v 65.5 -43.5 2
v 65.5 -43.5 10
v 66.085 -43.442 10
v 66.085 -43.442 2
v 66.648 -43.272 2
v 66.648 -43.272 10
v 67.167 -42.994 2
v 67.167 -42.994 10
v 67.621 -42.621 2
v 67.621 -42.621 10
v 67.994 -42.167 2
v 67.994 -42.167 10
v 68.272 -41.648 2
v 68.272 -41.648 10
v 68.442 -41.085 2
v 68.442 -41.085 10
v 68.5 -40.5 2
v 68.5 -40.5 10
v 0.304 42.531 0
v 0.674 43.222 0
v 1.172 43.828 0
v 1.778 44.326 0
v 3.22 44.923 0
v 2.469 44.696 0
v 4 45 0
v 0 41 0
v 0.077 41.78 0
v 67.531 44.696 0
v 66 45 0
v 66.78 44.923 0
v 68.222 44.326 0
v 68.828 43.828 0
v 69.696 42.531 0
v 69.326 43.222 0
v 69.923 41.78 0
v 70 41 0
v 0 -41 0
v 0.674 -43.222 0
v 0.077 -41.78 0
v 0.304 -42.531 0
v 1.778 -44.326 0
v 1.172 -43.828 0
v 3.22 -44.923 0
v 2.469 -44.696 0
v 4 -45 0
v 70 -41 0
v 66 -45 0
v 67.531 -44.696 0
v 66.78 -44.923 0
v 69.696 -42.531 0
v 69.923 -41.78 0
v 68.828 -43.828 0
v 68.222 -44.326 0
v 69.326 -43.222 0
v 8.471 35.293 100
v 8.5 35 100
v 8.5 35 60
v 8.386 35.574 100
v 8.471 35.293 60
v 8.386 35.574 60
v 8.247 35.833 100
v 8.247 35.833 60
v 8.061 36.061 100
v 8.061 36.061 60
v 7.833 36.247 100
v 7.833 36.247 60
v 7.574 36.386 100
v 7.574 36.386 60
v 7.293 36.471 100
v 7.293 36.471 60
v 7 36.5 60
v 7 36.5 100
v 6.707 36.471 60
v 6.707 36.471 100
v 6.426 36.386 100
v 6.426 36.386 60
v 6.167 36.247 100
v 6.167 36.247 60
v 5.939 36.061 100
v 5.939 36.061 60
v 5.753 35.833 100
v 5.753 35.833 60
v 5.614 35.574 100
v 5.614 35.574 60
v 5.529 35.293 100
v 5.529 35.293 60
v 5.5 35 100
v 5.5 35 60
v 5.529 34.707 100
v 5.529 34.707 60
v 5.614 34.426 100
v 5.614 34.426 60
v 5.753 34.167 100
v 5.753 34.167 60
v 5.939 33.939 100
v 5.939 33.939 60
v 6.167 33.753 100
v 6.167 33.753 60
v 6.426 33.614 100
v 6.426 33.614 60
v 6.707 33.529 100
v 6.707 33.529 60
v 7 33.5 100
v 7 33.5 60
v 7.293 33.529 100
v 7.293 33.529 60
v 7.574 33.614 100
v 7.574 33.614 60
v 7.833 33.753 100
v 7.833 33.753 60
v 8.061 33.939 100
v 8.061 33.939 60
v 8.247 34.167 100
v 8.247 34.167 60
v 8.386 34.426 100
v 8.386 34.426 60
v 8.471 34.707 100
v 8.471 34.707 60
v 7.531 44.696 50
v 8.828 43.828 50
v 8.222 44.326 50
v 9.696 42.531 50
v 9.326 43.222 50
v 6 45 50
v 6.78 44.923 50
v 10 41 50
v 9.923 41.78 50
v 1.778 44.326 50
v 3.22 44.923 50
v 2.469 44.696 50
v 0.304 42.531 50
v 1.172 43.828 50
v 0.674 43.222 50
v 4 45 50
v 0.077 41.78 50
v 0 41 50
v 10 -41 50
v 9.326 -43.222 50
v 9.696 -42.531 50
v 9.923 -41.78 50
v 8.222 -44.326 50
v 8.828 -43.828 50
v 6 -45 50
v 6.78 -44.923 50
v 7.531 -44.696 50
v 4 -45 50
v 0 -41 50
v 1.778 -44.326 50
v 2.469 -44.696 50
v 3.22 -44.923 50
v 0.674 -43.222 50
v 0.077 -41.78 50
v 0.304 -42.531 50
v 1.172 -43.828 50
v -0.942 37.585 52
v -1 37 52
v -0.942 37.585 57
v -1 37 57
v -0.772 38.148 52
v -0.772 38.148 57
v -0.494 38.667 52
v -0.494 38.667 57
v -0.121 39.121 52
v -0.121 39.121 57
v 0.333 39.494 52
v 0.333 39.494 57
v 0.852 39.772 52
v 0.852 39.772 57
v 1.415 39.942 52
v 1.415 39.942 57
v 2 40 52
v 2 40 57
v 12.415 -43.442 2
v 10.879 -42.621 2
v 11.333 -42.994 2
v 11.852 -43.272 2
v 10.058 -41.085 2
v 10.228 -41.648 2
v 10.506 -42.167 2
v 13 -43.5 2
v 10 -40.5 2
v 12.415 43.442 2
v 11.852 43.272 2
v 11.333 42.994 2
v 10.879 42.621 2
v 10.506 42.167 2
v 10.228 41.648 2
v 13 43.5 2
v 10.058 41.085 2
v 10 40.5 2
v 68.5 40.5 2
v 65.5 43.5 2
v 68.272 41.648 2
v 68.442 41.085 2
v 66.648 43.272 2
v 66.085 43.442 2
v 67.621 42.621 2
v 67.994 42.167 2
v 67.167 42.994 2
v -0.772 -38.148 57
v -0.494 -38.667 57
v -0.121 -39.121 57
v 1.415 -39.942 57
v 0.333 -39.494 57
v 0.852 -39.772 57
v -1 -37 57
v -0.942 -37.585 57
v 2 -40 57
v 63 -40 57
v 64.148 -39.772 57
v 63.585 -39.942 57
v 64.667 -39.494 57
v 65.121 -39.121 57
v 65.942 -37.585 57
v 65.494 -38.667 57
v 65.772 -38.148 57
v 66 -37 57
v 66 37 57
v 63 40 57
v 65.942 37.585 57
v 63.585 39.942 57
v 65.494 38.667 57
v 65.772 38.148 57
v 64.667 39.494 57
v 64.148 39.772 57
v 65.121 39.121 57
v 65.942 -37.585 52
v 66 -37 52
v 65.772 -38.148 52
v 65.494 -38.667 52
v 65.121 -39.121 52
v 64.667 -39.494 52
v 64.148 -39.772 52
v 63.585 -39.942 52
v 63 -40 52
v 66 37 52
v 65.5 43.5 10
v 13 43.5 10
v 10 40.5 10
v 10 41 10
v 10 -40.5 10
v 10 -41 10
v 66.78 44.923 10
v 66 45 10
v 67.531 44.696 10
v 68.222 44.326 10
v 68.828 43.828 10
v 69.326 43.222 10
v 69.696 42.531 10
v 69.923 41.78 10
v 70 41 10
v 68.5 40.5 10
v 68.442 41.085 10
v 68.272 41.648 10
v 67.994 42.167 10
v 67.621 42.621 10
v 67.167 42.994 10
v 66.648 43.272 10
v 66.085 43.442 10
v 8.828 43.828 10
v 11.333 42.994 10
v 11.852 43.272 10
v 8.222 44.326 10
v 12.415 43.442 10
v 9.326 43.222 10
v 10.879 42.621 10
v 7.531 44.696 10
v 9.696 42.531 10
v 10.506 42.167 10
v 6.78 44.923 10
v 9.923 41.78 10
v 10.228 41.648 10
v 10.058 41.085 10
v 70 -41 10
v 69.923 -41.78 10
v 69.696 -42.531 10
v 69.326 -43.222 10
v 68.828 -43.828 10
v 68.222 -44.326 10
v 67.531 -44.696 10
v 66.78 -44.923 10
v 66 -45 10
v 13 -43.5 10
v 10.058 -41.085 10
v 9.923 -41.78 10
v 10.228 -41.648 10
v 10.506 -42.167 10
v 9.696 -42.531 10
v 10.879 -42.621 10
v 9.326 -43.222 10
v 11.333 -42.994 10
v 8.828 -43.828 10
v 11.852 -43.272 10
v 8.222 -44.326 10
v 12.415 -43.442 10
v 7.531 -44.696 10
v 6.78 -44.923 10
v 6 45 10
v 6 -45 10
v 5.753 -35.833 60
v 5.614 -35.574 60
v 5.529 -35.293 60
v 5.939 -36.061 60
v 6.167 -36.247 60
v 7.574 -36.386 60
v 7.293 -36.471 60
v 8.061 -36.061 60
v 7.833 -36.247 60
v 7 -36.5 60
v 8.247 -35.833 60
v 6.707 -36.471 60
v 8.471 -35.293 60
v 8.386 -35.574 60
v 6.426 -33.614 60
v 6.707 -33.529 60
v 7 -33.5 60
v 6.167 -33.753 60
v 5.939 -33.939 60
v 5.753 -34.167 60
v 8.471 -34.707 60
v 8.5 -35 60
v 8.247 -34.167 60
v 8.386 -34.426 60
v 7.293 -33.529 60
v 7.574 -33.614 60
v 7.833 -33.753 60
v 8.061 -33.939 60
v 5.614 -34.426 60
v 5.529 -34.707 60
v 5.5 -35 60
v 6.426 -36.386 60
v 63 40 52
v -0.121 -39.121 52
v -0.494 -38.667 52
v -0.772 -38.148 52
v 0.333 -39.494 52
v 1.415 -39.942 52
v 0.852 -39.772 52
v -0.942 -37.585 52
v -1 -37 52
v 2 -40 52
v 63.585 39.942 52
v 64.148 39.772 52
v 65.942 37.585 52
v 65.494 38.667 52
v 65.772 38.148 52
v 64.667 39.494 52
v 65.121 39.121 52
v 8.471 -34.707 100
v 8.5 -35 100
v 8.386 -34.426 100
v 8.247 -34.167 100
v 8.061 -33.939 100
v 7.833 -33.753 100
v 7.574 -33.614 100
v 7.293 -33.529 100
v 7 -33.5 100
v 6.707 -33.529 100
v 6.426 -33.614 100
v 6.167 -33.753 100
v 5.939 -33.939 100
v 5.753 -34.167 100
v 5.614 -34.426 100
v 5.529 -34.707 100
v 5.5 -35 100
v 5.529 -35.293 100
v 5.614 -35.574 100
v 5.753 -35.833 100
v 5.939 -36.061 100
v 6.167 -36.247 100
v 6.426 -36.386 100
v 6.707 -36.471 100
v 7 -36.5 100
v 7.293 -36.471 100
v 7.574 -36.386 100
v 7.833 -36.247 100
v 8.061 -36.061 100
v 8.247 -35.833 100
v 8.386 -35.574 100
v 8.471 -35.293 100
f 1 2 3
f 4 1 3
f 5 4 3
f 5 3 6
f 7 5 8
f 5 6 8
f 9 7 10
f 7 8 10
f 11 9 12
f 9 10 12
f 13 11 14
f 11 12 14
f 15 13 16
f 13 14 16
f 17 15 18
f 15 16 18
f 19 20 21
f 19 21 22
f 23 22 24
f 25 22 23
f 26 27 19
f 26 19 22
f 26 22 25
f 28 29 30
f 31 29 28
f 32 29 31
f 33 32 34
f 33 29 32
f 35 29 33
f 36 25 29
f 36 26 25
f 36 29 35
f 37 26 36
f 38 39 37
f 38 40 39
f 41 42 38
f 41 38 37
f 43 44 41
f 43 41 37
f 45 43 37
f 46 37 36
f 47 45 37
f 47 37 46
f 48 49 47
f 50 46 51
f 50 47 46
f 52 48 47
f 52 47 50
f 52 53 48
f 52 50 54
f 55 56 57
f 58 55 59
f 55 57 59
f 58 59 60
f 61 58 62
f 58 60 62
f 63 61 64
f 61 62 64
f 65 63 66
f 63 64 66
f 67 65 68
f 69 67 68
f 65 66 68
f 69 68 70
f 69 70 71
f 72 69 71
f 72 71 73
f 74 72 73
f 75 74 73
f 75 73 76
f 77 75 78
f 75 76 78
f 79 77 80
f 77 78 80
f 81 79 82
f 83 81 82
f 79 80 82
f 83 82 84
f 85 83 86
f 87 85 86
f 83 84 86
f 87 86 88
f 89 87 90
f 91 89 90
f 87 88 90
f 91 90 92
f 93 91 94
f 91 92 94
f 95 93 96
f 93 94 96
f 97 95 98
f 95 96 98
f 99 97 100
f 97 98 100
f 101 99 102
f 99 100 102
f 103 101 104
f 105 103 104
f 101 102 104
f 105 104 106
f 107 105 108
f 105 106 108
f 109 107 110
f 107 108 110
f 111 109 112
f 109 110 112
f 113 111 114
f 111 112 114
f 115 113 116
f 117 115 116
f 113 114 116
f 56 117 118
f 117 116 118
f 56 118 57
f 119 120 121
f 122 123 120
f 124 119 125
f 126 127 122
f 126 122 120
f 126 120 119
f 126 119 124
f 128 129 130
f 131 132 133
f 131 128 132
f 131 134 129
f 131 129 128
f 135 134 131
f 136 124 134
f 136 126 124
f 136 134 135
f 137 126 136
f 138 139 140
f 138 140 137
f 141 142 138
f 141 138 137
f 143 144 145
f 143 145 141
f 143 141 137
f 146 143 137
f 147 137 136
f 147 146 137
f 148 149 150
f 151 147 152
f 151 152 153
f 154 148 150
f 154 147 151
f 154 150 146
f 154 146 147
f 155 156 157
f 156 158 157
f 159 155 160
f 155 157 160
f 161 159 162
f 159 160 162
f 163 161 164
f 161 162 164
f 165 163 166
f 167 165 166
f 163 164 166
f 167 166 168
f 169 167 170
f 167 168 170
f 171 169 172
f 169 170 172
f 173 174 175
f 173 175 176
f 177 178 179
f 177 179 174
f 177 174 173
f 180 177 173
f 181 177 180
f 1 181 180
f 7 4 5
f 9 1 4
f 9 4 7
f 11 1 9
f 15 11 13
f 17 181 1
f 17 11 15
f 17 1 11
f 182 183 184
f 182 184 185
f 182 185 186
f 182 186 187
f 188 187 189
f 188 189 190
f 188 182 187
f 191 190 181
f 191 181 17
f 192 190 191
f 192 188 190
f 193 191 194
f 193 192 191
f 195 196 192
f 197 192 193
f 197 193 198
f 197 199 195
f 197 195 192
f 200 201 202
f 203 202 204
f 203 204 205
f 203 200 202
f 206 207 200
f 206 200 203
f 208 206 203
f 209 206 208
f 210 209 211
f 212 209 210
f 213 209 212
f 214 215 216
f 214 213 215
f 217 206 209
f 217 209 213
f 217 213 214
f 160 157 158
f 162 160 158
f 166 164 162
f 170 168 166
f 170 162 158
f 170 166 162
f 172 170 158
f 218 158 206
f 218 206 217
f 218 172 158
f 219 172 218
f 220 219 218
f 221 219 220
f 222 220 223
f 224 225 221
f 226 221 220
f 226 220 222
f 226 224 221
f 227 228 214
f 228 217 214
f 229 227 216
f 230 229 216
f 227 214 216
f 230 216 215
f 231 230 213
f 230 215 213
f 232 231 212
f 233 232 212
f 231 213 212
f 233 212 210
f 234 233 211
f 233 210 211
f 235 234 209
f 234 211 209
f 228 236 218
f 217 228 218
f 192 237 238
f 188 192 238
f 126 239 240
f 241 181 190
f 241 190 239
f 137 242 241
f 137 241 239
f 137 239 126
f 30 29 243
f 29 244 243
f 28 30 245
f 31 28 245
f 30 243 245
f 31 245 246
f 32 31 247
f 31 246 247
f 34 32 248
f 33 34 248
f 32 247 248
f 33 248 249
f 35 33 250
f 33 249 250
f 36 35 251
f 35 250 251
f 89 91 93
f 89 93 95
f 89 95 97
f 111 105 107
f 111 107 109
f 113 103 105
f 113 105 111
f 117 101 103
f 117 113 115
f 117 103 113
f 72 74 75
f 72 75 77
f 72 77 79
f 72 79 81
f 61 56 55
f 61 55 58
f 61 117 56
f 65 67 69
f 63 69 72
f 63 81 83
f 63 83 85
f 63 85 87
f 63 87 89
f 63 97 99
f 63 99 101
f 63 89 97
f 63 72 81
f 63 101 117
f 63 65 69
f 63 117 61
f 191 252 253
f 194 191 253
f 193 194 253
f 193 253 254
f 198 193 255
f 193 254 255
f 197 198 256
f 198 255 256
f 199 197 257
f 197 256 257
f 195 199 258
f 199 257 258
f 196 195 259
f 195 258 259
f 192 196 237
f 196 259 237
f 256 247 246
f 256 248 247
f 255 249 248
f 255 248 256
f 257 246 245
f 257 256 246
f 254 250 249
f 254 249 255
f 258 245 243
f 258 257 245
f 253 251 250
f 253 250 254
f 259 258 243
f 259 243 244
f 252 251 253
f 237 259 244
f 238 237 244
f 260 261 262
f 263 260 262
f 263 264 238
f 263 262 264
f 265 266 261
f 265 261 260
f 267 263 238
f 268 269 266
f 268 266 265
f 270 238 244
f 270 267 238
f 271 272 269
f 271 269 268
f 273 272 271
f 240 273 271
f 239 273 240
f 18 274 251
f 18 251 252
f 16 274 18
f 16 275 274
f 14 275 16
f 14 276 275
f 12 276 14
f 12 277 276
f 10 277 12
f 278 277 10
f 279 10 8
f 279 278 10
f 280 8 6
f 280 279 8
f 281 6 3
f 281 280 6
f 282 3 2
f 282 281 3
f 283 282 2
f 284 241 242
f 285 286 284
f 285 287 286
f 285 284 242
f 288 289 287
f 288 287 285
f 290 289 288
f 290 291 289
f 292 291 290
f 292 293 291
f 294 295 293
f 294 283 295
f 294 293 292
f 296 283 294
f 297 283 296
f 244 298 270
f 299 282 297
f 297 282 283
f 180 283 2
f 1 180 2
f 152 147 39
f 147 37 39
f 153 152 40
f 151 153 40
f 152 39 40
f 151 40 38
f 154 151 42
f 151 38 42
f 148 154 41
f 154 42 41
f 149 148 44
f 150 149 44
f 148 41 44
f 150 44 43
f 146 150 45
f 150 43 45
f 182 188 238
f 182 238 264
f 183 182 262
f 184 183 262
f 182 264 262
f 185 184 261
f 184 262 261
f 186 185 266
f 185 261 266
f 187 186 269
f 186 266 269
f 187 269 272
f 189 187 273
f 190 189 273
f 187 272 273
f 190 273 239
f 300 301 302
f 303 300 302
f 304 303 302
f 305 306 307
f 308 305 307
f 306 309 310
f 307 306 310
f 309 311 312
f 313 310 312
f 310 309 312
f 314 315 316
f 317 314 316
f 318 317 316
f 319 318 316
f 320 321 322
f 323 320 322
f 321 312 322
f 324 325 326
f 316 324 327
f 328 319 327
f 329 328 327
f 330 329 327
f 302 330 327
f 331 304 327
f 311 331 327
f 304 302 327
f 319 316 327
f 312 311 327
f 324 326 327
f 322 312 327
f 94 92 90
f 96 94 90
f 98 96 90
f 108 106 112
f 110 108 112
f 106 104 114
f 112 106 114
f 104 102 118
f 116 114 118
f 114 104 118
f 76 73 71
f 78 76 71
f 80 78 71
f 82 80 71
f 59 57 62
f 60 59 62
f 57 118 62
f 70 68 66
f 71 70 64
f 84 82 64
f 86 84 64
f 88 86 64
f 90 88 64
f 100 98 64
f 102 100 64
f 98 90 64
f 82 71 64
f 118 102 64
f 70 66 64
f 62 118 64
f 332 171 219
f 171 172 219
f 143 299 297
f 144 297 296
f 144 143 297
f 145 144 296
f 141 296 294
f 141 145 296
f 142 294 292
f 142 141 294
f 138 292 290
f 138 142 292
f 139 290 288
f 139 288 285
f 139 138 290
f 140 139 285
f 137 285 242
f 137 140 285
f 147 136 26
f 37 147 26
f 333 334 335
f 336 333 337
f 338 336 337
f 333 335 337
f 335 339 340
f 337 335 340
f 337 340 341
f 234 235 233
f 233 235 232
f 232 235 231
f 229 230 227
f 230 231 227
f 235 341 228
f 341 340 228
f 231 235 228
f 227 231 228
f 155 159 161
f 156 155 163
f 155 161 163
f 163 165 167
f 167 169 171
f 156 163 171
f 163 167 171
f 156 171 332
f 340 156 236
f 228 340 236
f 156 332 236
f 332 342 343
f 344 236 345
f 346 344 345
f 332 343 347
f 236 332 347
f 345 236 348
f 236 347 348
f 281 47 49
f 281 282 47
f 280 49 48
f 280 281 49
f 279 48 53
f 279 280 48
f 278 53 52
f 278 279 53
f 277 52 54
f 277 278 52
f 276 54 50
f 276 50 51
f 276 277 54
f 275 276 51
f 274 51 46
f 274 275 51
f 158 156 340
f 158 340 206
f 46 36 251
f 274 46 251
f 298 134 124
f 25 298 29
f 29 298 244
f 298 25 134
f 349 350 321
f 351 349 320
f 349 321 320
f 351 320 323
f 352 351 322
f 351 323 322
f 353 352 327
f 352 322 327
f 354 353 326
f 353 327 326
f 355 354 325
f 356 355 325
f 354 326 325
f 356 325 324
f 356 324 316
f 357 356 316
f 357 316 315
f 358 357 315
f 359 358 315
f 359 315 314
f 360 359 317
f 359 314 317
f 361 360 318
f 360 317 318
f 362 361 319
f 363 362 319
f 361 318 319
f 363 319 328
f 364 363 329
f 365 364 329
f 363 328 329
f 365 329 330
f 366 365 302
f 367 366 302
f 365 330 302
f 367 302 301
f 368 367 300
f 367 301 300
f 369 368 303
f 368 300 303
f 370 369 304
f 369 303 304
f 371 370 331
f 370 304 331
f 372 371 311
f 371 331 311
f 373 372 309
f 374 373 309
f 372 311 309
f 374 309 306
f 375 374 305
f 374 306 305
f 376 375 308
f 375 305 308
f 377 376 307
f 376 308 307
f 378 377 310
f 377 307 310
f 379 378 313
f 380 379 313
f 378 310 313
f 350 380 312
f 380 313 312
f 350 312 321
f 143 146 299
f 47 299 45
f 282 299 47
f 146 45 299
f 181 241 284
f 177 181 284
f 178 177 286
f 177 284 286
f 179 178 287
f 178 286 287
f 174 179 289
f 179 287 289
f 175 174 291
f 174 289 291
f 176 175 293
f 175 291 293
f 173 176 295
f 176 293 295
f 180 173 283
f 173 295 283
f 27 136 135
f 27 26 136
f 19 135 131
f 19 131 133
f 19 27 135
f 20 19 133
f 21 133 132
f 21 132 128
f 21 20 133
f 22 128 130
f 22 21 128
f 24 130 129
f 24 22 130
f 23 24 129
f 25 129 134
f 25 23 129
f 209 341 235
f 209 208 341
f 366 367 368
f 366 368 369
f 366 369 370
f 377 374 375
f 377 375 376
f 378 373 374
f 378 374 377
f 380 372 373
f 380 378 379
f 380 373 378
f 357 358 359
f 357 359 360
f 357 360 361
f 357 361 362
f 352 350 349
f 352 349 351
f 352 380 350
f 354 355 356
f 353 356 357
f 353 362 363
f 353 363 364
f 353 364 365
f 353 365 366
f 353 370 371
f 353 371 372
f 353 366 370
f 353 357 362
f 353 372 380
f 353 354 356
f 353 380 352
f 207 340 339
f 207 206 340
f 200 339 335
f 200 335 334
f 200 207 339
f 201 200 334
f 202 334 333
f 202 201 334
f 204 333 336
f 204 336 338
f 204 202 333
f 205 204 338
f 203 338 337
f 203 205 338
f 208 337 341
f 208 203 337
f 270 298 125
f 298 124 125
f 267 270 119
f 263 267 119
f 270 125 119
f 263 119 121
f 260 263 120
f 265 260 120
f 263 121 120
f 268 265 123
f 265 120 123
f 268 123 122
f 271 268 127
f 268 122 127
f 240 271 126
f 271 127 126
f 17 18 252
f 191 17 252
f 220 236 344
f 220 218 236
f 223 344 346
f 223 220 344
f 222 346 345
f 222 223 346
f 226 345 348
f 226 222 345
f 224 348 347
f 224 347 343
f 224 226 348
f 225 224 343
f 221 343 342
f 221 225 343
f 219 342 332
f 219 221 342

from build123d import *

# Parameters (mm, degrees)
F1_DEPTH      = 45
F1_DEPTH_BACK = 45
F5_DEPTH      = 8
F3_W          = 67
F3_H          = 5
F6_DEPTH      = 40
F6_DEPTH_BACK = 40
F7_R          = 4
F8_R          = 3
F9_R          = 1.5
F10_DEPTH     = 40


with BuildPart() as f1:
    # F0 (on Front) → F1 (new body, two sides)
    with BuildSketch(Plane.XZ) as f1_sk:
        Polygon((0, 50), (0, 0), (70, 0), (70, 10), (10, 10), (10, 50), align=None)
    extrude(amount=F1_DEPTH)
    extrude(f1_sk.sketch, amount=-F1_DEPTH_BACK)

    # F4 (on face) → F5 (cut)
    with BuildSketch(Plane.XY.offset(10)):
        with BuildLine():
            ThreePointArc((68.5, 40.5), (67.6213203436, 42.6213203436), (65.5, 43.5))
            Line((65.5, 43.5), (13, 43.5))
            ThreePointArc((13, 43.5), (10.8786796564, 42.6213203436), (10, 40.5))
            Line((10, 40.5), (10, -40.5))
            ThreePointArc((10, -40.5), (10.8786796564, -42.6213203436), (13, -43.5))
            Line((13, -43.5), (65.5, -43.5))
            ThreePointArc((65.5, -43.5), (67.6213203436, -42.6213203436), (68.5, -40.5))
            Line((68.5, -40.5), (68.5, 40.5))
        make_face()
    extrude(amount=-F5_DEPTH, mode=Mode.SUBTRACT)

    # F7
    f7_edges = [f1.edges().sort_by_distance(p)[0] for p in [
        (70, -45, 5),
        (70, 45, 5),
        (0, -45, 25),
        (0, 45, 25),
        (10, -45, 30),
        (10, 45, 30),
    ]]
    fillet(f7_edges, radius=F7_R)


with BuildPart() as f6:
    # F3 (on Front) → F6 (new body, two sides)
    with BuildSketch(Plane.XZ) as f6_sk:
        with Locations((32.5, 54.5)):
            Rectangle(F3_W, F3_H)
    extrude(amount=-F6_DEPTH)
    extrude(f6_sk.sketch, amount=F6_DEPTH_BACK)

    # F8
    f8_edges = [f6.edges().sort_by_distance(p)[0] for p in [
        (66, -40, 54.5),
        (66, 40, 54.5),
        (-1, 40, 54.5),
        (-1, -40, 54.5),
    ]]
    fillet(f8_edges, radius=F8_R)


with BuildPart() as f10:
    # F9 (on offset) → F10 (new body)
    with BuildSketch(Plane.XY.offset(60)):
        with Locations((7, -35)):
            Circle(F9_R)
    extrude(amount=F10_DEPTH)


with BuildPart() as f10b:
    # F9 (on offset) → F10, piece 2 (new body)
    with BuildSketch(Plane.XY.offset(60)):
        with Locations((7, 35)):
            Circle(F9_R)
    extrude(amount=F10_DEPTH)


solid = Compound([f1.part, f6.part, f10.part, f10b.part])
